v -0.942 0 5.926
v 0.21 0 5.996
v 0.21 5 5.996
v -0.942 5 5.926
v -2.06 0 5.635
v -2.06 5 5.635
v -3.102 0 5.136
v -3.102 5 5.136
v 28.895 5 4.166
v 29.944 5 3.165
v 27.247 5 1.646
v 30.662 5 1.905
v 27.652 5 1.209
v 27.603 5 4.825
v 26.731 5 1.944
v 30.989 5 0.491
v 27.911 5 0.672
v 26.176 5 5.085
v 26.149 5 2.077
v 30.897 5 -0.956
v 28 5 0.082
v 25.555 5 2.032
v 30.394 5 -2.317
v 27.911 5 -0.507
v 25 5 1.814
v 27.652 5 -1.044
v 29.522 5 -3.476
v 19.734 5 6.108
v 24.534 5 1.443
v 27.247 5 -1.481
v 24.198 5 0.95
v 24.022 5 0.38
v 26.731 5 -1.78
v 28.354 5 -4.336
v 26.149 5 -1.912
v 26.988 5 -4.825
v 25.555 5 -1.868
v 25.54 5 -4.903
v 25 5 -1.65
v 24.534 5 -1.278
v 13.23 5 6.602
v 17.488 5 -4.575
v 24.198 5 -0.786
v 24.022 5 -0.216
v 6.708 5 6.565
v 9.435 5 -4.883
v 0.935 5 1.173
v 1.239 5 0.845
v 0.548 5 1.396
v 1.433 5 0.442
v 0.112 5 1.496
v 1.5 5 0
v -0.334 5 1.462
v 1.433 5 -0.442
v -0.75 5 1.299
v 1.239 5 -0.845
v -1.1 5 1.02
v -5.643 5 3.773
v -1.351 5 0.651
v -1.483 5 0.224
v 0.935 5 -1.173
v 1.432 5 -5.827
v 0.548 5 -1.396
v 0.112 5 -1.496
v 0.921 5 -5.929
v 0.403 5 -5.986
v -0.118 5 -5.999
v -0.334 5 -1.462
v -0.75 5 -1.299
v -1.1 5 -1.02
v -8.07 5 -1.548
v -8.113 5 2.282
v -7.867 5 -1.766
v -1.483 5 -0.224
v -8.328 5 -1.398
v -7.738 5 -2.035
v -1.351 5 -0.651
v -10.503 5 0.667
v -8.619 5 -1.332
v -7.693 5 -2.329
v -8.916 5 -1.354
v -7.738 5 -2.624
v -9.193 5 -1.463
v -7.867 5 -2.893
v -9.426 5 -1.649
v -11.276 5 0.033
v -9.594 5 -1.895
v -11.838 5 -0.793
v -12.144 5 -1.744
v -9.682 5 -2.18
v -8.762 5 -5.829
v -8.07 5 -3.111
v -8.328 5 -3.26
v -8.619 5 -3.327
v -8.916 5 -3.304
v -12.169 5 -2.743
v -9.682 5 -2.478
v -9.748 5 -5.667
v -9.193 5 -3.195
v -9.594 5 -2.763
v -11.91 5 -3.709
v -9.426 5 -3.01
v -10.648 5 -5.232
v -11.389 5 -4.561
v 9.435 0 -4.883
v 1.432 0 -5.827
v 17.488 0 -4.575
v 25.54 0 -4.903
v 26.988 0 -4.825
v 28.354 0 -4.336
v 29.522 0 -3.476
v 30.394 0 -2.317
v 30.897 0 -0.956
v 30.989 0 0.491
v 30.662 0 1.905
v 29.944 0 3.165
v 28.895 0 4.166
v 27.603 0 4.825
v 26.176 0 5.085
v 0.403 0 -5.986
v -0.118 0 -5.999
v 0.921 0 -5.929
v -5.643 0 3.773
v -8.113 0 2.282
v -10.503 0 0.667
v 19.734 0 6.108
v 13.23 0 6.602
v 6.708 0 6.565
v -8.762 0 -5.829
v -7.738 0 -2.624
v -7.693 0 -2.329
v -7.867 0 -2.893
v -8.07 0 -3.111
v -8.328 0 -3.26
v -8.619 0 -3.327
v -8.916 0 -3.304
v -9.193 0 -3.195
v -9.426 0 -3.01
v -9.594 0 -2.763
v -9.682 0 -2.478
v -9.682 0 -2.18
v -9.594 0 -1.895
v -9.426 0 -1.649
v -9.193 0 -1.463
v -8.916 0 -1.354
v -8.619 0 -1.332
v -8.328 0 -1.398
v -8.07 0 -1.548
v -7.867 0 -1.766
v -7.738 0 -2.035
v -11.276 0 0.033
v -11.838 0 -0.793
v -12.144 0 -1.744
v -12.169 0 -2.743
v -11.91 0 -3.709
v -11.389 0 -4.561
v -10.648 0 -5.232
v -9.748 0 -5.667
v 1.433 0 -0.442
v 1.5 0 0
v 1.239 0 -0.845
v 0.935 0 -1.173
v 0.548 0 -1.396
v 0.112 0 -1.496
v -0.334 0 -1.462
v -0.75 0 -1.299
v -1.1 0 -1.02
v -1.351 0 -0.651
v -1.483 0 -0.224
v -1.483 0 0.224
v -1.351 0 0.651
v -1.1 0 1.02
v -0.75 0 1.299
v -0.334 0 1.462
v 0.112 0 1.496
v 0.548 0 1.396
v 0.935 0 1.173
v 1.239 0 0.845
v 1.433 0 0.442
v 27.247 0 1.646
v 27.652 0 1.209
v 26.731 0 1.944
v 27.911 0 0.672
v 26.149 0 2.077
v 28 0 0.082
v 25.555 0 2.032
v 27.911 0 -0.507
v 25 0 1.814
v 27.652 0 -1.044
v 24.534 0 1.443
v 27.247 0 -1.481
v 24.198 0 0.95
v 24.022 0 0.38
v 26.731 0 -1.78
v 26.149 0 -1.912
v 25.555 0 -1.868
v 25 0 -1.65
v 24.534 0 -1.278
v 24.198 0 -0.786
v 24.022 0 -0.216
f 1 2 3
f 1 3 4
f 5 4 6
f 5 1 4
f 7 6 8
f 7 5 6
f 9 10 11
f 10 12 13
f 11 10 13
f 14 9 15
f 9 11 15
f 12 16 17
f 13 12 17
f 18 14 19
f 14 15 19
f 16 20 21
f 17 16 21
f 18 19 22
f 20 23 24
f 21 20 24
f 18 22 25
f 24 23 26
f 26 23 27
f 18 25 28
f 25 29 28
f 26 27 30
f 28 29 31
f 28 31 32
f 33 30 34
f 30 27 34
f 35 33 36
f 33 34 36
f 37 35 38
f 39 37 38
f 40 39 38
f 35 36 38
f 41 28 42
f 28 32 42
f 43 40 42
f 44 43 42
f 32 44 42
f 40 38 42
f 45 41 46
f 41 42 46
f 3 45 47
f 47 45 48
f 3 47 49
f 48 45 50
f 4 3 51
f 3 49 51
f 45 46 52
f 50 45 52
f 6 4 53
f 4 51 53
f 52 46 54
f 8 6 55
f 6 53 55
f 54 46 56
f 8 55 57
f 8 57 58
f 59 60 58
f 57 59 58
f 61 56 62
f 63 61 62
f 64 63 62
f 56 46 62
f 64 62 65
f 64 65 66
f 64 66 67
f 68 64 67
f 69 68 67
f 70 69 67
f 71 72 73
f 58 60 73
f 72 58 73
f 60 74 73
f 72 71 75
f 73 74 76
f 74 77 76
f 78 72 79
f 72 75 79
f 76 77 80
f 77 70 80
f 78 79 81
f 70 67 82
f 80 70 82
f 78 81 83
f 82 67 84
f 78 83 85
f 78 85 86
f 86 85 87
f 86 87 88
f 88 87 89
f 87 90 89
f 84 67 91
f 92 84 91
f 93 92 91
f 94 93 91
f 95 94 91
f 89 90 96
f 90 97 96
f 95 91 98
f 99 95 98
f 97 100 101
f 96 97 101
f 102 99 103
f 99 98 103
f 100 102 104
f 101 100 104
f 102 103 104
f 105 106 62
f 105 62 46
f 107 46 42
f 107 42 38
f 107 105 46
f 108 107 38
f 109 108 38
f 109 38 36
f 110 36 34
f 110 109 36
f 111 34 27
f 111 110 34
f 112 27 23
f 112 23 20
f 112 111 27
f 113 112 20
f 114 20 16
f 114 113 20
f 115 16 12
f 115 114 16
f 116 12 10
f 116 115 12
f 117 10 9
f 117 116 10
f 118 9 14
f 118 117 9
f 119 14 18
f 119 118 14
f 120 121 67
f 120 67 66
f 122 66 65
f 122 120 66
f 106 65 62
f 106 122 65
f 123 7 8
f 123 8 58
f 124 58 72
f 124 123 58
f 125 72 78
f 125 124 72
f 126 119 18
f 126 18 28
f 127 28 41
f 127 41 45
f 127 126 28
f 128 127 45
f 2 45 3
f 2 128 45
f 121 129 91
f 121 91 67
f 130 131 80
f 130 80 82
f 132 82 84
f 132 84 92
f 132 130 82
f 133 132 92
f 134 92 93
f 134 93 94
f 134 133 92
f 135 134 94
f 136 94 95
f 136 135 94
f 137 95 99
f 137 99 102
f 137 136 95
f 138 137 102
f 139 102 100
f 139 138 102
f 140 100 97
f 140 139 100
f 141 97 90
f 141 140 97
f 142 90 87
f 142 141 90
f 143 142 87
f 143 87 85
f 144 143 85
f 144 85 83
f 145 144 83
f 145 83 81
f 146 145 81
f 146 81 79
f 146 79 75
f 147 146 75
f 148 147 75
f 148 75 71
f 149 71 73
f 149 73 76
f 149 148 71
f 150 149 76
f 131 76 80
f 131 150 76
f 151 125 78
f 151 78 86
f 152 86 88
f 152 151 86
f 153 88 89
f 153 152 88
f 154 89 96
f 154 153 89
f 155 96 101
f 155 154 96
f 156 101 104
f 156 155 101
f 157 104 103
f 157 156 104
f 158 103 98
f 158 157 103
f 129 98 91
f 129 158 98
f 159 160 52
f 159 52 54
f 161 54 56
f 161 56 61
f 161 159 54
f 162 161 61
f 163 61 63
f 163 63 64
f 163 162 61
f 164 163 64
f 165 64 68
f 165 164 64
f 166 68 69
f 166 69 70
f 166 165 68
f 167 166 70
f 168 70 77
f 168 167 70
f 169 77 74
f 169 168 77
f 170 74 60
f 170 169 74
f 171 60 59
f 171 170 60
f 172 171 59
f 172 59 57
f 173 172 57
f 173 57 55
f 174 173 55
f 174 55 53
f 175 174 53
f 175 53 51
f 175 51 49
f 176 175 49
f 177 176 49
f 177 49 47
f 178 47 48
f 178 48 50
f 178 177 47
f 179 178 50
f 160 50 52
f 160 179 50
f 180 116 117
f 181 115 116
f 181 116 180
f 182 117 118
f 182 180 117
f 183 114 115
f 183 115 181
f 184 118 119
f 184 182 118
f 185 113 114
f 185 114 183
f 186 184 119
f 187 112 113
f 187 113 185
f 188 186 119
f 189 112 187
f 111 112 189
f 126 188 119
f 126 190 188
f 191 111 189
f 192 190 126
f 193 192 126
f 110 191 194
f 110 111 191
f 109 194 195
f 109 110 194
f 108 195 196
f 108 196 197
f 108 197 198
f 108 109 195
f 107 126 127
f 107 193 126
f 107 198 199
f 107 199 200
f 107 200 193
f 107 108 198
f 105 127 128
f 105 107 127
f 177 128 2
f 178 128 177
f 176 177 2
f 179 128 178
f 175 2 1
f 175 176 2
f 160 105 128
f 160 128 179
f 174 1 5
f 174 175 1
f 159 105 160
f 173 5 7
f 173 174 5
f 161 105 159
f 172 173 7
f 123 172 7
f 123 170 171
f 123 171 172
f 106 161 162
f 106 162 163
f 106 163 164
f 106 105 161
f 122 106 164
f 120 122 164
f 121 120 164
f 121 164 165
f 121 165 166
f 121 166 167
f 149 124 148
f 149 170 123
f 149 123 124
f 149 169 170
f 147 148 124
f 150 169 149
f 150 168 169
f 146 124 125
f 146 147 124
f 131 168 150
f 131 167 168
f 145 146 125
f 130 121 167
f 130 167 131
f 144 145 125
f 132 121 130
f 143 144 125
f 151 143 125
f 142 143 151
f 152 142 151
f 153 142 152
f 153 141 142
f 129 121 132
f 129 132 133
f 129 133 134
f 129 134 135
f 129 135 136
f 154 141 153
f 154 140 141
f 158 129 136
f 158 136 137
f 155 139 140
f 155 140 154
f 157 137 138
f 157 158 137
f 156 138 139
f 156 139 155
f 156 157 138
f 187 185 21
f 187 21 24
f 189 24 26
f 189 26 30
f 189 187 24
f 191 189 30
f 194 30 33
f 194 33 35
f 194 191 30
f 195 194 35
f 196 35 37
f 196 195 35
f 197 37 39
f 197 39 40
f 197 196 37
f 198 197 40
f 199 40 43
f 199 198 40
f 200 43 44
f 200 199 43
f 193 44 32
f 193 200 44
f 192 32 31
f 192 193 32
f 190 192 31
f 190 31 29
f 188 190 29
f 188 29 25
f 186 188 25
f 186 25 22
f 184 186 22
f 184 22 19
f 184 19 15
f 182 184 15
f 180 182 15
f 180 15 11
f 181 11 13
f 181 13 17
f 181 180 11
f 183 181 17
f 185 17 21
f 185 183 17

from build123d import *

# Parameters (mm, degrees)
SKETCH1_R           = 1.5
SKETCH1_R_2         = 2
SKETCH1_R_3         = 1
BOSS_EXTRUDE1_DEPTH = 5


with BuildPart() as part:
    # Sketch1 → Boss-Extrude1 (new body)
    with BuildSketch(Plane(origin=(0, 0, 0), x_dir=(1, 0, 0), z_dir=(0, 1, 0))):
        with BuildLine():
            Line((-8.762210389, 5.828693601), (-0.11807649, 5.998838049))
            ThreePointArc((-0.11807649, 5.998838049), (0.662554919, 5.963306212), (1.431947779, 5.82662214))
            ThreePointArc((1.431947779, 5.82662214), (13.458528139, 4.649327756), (25.539939967, 4.902597239))
            ThreePointArc((25.539939967, 4.902597239), (30.995866152, 0.235754194), (26.175572284, -5.085084233))
            ThreePointArc((26.175572284, -5.085084233), (13.230242543, -6.601805731), (0.210435347, -5.996308612))
            ThreePointArc((0.210435347, -5.996308612), (-1.508245613, -5.807339767), (-3.101676264, -5.136107899))
            ThreePointArc((-3.101676264, -5.136107899), (-6.887532568, -3.042769433), (-10.502643591, -0.666691535))
            ThreePointArc((-10.502643591, -0.666691535), (-12.074072829, 3.235238064), (-8.762210389, 5.828693601))
        make_face()
        Circle(SKETCH1_R, mode=Mode.SUBTRACT)
        with Locations((26, -0.082190865)):
            Circle(SKETCH1_R_2, mode=Mode.SUBTRACT)
        with Locations((-8.693332437, 2.329371406)):
            Circle(SKETCH1_R_3, mode=Mode.SUBTRACT)
    extrude(amount=BOSS_EXTRUDE1_DEPTH)


solid = part.part
